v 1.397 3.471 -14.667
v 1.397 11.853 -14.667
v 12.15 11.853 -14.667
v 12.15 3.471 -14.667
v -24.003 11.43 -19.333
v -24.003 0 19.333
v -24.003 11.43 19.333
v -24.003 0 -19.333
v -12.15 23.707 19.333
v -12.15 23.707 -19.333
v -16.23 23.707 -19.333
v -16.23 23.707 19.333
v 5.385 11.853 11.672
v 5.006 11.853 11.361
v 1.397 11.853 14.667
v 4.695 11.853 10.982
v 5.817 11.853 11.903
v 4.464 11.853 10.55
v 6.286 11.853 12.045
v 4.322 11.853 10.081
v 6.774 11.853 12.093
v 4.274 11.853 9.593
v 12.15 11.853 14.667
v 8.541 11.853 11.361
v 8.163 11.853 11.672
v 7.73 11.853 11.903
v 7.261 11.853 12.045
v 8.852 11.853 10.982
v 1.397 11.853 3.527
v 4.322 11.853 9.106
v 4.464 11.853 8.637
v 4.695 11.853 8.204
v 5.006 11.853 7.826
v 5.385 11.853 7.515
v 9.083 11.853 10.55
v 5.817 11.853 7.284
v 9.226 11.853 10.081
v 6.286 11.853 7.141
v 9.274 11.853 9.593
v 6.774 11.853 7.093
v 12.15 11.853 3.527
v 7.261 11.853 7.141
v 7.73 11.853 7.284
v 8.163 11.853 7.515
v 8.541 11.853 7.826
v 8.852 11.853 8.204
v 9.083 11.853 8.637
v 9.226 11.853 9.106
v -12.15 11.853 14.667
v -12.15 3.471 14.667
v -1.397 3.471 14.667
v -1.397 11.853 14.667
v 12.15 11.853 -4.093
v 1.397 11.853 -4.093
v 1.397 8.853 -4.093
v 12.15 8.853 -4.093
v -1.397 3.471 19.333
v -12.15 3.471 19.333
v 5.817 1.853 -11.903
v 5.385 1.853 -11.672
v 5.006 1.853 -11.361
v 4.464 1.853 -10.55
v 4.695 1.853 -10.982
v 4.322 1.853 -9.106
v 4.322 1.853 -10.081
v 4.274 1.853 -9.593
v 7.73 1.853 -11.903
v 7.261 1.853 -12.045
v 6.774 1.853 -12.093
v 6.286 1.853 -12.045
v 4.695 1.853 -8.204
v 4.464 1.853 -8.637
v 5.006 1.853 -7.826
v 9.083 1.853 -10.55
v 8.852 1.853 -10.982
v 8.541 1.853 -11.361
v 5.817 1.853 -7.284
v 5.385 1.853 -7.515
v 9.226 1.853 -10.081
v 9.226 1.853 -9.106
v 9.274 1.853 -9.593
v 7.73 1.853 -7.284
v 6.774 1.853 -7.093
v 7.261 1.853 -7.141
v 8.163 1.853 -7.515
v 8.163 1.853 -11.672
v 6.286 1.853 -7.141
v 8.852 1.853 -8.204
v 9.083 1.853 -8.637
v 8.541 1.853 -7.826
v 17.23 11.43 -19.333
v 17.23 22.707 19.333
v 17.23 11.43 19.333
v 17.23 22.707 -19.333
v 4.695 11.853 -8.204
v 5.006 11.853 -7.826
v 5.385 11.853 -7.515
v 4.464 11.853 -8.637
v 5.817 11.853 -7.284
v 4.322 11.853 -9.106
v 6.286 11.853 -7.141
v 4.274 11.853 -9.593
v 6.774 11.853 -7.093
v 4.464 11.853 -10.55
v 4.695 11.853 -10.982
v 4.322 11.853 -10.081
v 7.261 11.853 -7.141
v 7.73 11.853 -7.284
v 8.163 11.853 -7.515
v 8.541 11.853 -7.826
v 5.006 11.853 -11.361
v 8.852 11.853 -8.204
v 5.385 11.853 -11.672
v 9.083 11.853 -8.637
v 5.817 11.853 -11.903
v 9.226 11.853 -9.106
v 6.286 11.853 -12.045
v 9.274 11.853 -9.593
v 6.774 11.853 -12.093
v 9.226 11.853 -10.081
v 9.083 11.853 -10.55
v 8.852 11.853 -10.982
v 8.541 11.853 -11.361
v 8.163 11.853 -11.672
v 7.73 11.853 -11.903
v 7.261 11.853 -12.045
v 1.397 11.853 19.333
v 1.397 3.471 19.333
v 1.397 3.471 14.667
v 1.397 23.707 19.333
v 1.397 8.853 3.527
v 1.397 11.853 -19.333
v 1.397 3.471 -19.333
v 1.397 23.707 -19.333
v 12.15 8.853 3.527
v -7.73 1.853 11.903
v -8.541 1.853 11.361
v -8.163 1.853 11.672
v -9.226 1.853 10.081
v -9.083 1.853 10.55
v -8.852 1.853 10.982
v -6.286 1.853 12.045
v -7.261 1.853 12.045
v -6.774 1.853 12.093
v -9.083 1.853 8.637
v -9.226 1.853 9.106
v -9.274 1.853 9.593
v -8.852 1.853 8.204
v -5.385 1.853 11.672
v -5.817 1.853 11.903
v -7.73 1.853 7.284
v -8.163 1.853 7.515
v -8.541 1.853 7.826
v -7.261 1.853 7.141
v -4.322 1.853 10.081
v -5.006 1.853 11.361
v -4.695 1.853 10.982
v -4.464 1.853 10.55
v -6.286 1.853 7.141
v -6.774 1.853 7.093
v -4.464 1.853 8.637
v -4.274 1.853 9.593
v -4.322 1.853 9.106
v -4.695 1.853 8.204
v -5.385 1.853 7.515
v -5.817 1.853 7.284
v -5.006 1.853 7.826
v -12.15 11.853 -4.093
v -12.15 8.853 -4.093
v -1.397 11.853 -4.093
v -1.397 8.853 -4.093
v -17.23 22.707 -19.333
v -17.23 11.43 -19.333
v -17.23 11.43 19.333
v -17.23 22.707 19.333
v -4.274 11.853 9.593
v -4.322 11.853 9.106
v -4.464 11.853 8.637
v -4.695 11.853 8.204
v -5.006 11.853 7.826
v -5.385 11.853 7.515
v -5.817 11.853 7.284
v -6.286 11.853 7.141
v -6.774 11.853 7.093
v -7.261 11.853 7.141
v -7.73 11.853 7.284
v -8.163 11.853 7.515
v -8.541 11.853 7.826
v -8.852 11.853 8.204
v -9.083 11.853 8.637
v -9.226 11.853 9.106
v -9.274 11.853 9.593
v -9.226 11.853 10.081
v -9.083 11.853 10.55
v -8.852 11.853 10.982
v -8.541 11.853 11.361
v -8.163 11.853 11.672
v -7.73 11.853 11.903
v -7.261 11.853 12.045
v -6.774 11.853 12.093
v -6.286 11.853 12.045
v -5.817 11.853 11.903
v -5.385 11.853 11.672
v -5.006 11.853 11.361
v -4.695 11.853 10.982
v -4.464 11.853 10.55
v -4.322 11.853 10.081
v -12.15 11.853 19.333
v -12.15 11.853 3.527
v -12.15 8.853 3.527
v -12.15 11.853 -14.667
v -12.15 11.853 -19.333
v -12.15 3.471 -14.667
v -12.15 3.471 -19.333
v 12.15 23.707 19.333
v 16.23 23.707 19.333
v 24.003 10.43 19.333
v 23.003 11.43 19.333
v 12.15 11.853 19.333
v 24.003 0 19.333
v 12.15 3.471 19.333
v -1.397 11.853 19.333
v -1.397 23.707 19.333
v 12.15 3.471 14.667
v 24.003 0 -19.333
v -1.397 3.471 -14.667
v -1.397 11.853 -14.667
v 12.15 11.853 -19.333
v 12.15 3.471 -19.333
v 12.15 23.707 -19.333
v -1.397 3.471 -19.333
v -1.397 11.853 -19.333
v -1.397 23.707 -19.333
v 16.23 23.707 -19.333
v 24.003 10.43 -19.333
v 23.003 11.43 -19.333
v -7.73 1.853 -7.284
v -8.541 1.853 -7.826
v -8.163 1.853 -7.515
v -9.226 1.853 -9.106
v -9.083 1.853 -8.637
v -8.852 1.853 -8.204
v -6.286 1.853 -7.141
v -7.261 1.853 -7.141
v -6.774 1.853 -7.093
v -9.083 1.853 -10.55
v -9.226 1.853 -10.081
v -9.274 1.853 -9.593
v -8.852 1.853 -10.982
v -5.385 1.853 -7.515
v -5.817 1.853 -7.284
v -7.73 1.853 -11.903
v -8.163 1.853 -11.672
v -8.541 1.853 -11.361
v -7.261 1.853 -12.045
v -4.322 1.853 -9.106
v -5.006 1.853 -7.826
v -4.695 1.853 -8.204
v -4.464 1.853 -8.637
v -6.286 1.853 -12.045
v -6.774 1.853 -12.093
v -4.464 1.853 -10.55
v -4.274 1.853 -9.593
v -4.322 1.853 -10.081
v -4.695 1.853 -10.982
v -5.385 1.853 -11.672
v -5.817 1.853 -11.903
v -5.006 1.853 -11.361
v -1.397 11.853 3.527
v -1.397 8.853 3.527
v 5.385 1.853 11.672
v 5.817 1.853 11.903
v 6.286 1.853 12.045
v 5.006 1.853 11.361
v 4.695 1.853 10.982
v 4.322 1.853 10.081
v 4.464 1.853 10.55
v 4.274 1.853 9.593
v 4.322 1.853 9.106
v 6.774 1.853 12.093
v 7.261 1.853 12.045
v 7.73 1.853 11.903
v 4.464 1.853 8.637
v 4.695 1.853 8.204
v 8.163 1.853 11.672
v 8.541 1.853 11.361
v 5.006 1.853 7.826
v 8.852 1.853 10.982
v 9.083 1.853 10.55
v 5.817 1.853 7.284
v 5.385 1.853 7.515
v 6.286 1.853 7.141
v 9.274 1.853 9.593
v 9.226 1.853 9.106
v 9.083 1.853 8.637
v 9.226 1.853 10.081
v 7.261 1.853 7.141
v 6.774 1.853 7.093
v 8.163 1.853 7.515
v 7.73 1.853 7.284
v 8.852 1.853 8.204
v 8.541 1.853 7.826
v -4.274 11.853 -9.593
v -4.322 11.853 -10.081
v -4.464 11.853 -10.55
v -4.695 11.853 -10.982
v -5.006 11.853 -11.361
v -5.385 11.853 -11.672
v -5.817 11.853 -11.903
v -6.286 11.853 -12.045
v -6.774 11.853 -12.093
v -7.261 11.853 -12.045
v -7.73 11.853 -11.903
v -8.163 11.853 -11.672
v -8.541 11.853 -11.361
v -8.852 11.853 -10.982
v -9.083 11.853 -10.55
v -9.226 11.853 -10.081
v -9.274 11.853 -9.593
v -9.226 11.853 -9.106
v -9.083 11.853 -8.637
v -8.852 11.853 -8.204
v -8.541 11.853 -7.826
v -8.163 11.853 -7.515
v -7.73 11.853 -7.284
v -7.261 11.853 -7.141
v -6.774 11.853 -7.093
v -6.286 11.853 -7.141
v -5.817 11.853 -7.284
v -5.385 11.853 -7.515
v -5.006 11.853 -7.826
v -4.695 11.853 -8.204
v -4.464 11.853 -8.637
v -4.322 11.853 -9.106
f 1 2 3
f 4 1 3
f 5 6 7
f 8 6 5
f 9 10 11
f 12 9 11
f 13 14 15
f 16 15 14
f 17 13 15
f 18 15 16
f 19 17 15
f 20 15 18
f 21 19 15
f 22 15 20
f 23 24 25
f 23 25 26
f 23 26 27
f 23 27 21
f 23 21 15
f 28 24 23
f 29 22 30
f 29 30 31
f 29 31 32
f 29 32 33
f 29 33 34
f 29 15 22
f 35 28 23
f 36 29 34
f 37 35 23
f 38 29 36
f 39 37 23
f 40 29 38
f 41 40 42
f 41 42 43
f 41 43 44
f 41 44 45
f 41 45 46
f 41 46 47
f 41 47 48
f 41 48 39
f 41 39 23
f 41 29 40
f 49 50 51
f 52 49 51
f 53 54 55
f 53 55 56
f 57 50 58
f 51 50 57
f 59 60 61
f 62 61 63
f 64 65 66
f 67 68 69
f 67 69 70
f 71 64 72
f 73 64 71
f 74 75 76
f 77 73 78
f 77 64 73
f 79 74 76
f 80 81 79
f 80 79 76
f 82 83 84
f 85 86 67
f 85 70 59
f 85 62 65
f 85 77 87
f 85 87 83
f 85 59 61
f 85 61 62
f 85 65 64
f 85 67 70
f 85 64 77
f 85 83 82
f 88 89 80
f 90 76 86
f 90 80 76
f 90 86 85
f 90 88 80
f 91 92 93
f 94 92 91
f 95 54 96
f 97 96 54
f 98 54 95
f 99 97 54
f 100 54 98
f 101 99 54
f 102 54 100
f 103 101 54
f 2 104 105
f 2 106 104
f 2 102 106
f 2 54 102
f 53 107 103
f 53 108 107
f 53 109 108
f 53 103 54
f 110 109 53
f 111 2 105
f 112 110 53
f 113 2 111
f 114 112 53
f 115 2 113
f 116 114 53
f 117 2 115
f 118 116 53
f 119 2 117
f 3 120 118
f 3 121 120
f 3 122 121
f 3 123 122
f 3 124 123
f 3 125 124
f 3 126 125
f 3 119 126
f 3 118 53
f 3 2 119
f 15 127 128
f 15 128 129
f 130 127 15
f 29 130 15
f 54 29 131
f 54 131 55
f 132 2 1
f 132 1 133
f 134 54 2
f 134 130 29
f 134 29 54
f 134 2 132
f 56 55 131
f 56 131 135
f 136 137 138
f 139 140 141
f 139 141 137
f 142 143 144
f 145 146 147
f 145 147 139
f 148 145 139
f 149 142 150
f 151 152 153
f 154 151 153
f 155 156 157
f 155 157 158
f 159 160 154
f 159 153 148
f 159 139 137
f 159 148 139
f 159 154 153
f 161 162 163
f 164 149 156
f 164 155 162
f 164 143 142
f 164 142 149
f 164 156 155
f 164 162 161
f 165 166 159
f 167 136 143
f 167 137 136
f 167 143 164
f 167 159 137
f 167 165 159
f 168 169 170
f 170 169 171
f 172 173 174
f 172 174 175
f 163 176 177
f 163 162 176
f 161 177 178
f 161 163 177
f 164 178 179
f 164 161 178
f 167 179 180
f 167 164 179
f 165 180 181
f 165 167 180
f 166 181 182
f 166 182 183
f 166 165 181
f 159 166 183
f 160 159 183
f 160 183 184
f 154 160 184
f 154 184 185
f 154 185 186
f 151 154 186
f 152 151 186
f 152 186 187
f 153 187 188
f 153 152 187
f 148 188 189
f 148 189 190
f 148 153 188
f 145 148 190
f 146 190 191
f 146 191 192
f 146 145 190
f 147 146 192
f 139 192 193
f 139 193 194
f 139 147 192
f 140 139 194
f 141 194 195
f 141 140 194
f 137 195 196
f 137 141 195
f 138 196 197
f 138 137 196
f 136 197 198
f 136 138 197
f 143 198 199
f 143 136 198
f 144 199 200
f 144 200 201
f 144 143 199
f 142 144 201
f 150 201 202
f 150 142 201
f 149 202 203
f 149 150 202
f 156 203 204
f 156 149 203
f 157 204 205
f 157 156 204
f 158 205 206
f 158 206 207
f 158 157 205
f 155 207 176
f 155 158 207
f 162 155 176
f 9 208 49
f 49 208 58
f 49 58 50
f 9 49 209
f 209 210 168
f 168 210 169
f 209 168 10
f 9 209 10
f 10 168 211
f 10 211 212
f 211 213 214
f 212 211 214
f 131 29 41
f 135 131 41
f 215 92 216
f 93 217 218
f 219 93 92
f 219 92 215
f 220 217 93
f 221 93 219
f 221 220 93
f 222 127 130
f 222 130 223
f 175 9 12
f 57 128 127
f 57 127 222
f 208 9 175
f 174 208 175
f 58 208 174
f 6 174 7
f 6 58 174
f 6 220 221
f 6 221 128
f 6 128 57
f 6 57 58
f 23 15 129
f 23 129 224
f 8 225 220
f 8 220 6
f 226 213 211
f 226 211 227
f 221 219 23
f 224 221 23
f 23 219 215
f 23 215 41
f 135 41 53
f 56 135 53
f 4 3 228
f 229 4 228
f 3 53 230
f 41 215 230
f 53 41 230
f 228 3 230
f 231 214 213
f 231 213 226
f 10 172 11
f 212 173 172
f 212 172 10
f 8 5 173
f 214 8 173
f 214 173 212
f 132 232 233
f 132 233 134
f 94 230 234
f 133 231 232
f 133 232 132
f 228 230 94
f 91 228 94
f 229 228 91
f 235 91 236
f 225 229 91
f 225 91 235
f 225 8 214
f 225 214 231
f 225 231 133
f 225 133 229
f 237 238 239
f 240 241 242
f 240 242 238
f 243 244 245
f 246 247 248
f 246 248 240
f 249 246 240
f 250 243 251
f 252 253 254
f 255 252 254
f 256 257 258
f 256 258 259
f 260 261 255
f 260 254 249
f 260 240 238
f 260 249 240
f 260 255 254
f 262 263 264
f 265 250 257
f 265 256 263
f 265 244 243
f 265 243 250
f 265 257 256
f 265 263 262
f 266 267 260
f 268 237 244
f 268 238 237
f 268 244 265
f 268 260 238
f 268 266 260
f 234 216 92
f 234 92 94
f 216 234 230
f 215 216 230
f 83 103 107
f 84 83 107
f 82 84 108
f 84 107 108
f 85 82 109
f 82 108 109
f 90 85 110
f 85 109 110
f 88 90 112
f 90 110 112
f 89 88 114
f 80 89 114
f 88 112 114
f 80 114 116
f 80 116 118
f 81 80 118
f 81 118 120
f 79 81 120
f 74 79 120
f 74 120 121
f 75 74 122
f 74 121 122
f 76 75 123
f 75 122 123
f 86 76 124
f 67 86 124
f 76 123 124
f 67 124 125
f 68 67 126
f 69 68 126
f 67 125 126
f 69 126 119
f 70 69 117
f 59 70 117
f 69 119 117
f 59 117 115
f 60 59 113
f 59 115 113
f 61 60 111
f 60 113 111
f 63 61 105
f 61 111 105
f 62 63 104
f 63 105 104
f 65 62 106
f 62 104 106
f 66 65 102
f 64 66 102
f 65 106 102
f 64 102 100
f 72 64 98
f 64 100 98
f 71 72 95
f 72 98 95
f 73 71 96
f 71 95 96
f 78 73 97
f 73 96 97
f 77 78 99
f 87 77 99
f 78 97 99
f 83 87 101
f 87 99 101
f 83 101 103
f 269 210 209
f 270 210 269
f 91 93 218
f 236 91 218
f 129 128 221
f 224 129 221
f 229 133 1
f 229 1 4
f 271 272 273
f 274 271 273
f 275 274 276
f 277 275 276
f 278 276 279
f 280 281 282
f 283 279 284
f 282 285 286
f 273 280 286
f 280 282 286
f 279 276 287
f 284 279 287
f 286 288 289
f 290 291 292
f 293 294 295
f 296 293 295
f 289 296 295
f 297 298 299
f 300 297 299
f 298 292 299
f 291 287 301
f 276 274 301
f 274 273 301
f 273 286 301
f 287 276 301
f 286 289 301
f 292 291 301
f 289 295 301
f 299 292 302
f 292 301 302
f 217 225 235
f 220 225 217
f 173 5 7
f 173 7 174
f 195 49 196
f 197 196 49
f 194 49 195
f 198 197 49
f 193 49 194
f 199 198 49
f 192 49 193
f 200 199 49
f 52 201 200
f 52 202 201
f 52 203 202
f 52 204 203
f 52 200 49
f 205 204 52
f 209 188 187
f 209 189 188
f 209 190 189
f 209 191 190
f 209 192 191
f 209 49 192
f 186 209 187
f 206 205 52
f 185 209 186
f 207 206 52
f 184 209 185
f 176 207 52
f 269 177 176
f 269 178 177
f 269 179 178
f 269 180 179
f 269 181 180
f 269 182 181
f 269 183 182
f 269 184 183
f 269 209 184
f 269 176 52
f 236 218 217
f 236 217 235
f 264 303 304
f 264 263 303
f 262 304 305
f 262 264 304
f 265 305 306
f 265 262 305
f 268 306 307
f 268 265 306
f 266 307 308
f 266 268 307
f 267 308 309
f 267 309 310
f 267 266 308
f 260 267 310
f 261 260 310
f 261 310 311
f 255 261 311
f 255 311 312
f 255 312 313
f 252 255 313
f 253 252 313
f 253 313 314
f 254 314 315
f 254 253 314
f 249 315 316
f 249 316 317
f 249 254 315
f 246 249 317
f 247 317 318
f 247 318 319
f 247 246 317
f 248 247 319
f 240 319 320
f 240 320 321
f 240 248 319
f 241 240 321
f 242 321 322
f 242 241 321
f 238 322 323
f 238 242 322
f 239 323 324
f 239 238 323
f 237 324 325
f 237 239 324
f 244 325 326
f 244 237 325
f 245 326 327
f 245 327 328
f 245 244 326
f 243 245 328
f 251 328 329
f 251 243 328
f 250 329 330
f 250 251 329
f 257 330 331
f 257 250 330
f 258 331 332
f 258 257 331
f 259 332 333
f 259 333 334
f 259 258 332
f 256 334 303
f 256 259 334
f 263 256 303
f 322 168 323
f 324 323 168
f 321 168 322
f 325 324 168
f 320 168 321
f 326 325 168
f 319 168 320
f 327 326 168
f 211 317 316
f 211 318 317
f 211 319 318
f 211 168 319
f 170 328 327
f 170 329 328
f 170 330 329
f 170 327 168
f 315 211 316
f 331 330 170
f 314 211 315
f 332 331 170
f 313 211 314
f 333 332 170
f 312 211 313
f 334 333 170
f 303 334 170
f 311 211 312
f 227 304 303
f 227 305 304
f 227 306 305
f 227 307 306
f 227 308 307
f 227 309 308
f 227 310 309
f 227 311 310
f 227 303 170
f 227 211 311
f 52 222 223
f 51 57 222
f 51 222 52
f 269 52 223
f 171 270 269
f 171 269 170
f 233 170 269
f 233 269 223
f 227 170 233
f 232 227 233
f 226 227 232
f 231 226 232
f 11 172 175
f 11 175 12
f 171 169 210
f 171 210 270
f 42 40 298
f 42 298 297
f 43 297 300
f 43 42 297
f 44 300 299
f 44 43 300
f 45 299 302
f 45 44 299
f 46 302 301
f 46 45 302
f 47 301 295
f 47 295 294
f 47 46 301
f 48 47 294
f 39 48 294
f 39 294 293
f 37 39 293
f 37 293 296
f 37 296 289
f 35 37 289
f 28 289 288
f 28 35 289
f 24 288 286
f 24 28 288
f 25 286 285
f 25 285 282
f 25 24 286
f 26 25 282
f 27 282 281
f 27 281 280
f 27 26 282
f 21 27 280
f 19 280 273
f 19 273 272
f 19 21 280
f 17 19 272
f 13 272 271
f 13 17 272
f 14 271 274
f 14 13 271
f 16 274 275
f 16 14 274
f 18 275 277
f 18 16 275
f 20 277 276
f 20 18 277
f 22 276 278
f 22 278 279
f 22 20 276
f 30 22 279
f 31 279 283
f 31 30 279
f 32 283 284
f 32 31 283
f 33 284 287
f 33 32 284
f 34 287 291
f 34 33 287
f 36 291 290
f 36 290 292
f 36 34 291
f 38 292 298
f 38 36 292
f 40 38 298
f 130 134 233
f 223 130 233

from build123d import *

# Parameters (mm, degrees)
EXTRUDE_1_DEPTH        = 23.706666667
SKETCH_2_W             = 6.773333333
SKETCH_2_H             = 38.666666667
CUT_EXTRUDE_1_DEPTH    = 12.276666667
CHAMFER_1_SIZE         = 1
SKETCH_3_W             = 10.752666667
SKETCH_3_H             = 38.666666667
CUT_EXTRUDE_2_DEPTH    = 11.853333333
SKETCH_4_W             = 10.752666667
SKETCH_4_H             = 4.666666667
CUT_EXTRUDE_3_DEPTH    = 8.382
SKETCH_5_R             = 2.5
CUT_EXTRUDE_4_DEPTH    = 10
SKETCH_6_W             = 10.752666667
SKETCH_6_H             = 7.62
CUT_EXTRUDE_5_DEPTH    = 3
MIRROR_START           = 11.853333334
MIRROR_2_OUTLINE_W     = 10.752666667
MIRROR_2_OUTLINE_H     = 38.666666667
MIRROR_2_DEPTH         = 11.853333333
MIRROR_START_2         = 3.471333334
MIRROR_2_2_OUTLINE_W   = 10.752666667
MIRROR_2_2_OUTLINE_H   = 4.666666667
MIRROR_2_2_OUTLINE_H_2 = 4.666666668
MIRROR_2_2_OUTLINE_R   = 2.5
MIRROR_2_2_DEPTH       = 8.382
MIRROR_START_3         = 8.853333334
MIRROR_2_3_OUTLINE_W   = 10.752666667
MIRROR_2_3_OUTLINE_H   = 7.62
MIRROR_2_3_DEPTH       = 3
MIRROR_START_4         = 1.853333334
MIRROR_2_4_OUTLINE_R   = 2.5
MIRROR_2_4_DEPTH       = 1.618
MIRROR_START_5         = -19.333333333
MIRROR_2_5_DEPTH       = 38.666666667


# Read off the part's stored shape, not the designer's step: ﾐﾗｰ2
with BuildPart() as part:
    # ｽｹｯﾁ1 → ﾎﾞｽ - 押し出し1 (new body)
    with BuildSketch(Plane(origin=(0, 0, 0), x_dir=(1, 0, 0), z_dir=(0, 1, 0))):
        Polygon((-24.003333333, 19.333333333), (24.003333334, 19.333333333), (24.003333333, -19.333333334), (-24.003333333, -19.333333334), align=None)
    extrude(amount=EXTRUDE_1_DEPTH)

    # ｽｹｯﾁ2 → ｶｯﾄ - 押し出し1 (cut)
    with BuildSketch(Plane(origin=(0, 23.706666667, 0), x_dir=(1, 0, 0), z_dir=(0, 1, 0))):
        with Locations((20.616666667, -1e-09)):
            Rectangle(SKETCH_2_W, SKETCH_2_H)
    extrude(amount=-CUT_EXTRUDE_1_DEPTH, mode=Mode.SUBTRACT)

    # 面取り1
    chamfer_1_edges = [part.edges().sort_by_distance(p)[0] for p in [
        (24.003333334, 11.43, 0),
        (17.230000001, 23.706666667, 0),
    ]]
    chamfer(chamfer_1_edges, length=CHAMFER_1_SIZE)

    # ｽｹｯﾁ3 → ｶｯﾄ - 押し出し2 (cut)
    with BuildSketch(Plane(origin=(0, 23.706666667, 0), x_dir=(1, 0, 0), z_dir=(0, 1, 0))):
        with Locations((6.773666668, -1e-09)):
            Rectangle(SKETCH_3_W, SKETCH_3_H)
    extrude(amount=-CUT_EXTRUDE_2_DEPTH, mode=Mode.SUBTRACT)

    # ｽｹｯﾁ4 → ｶｯﾄ - 押し出し3 (cut)
    with BuildSketch(Plane(origin=(0, 11.853333334, 0), x_dir=(1, 0, 0), z_dir=(0, 1, 0))):
        with Locations((6.773666668, 17)):
            Rectangle(SKETCH_4_W, SKETCH_4_H)
    cut_extrude_3 = extrude(amount=-CUT_EXTRUDE_3_DEPTH, mode=Mode.SUBTRACT)

    # ｽｹｯﾁ5 → ｶｯﾄ - 押し出し4 (cut)
    with BuildSketch(Plane(origin=(0, 11.853333334, 0), x_dir=(1, 0, 0), z_dir=(0, 1, 0))):
        with Locations(Location((6.773666667, 9.593333333, 0), (0, 0, 270))):
            Circle(SKETCH_5_R)
    cut_extrude_4 = extrude(amount=-CUT_EXTRUDE_4_DEPTH, mode=Mode.SUBTRACT)

    # ﾐﾗｰ1: ｶｯﾄ - 押し出し3, ｶｯﾄ - 押し出し4 across plane
    add(cut_extrude_3.mirror(Plane.XY), mode=Mode.SUBTRACT)
    add(cut_extrude_4.mirror(Plane.XY), mode=Mode.SUBTRACT)

    # ｽｹｯﾁ6 → ｶｯﾄ - 押し出し5 (cut)
    with BuildSketch(Plane(origin=(0, 11.853333334, 0), x_dir=(1, 0, 0), z_dir=(0, 1, 0))):
        with Locations((6.773666668, 0.283333333)):
            Rectangle(SKETCH_6_W, SKETCH_6_H)
    extrude(amount=-CUT_EXTRUDE_5_DEPTH, mode=Mode.SUBTRACT)

    # ﾐﾗｰ2 outline → ﾐﾗｰ2 (cut)
    with BuildSketch(Plane(origin=(0, 0, 0), x_dir=(1, 0, 0), z_dir=(0, 1, 0)).offset(MIRROR_START)):
        with Locations((-6.773666668, -1e-09)):
            Rectangle(MIRROR_2_OUTLINE_W, MIRROR_2_OUTLINE_H)
    extrude(amount=MIRROR_2_DEPTH, mode=Mode.SUBTRACT)

    # Mirror 2 2 outline → Mirror 2 2 (cut)
    with BuildSketch(Plane(origin=(0, 0, 0), x_dir=(1, 0, 0), z_dir=(0, 1, 0)).offset(MIRROR_START_2)):
        with Locations((-6.773666668, 17)):
            Rectangle(MIRROR_2_2_OUTLINE_W, MIRROR_2_2_OUTLINE_H)
        with Locations((-6.773666668, -17)):
            Rectangle(MIRROR_2_2_OUTLINE_W, MIRROR_2_2_OUTLINE_H_2)
        with Locations((-6.773666667, 9.593333333)):
            Circle(MIRROR_2_2_OUTLINE_R)
        with Locations((-6.773666667, -9.593333333)):
            Circle(MIRROR_2_2_OUTLINE_R)
    extrude(amount=MIRROR_2_2_DEPTH, mode=Mode.SUBTRACT)

    # Mirror 2 3 outline → Mirror 2 3 (cut)
    with BuildSketch(Plane(origin=(0, 0, 0), x_dir=(1, 0, 0), z_dir=(0, 1, 0)).offset(MIRROR_START_3)):
        with Locations((-6.773666668, 0.283333333)):
            Rectangle(MIRROR_2_3_OUTLINE_W, MIRROR_2_3_OUTLINE_H)
    extrude(amount=MIRROR_2_3_DEPTH, mode=Mode.SUBTRACT)

    # Mirror 2 4 outline → Mirror 2 4 (cut)
    with BuildSketch(Plane(origin=(0, 0, 0), x_dir=(1, 0, 0), z_dir=(0, 1, 0)).offset(MIRROR_START_4)):
        with Locations((-6.773666667, 9.593333333)):
            Circle(MIRROR_2_4_OUTLINE_R)
        with Locations((-6.773666667, -9.593333333)):
            Circle(MIRROR_2_4_OUTLINE_R)
    extrude(amount=MIRROR_2_4_DEPTH, mode=Mode.SUBTRACT)

    # Mirror 2 5 outline → Mirror 2 5 (cut)
    with BuildSketch(Plane.XY.offset(MIRROR_START_5)):
        Polygon((-24.003333333, 23.706666667), (-24.003333333, 11.43), (-17.230000001, 11.43), (-17.230000001, 22.706666667), (-16.230000001, 23.706666667), align=None)
    extrude(amount=MIRROR_2_5_DEPTH, mode=Mode.SUBTRACT)


solid = part.part
